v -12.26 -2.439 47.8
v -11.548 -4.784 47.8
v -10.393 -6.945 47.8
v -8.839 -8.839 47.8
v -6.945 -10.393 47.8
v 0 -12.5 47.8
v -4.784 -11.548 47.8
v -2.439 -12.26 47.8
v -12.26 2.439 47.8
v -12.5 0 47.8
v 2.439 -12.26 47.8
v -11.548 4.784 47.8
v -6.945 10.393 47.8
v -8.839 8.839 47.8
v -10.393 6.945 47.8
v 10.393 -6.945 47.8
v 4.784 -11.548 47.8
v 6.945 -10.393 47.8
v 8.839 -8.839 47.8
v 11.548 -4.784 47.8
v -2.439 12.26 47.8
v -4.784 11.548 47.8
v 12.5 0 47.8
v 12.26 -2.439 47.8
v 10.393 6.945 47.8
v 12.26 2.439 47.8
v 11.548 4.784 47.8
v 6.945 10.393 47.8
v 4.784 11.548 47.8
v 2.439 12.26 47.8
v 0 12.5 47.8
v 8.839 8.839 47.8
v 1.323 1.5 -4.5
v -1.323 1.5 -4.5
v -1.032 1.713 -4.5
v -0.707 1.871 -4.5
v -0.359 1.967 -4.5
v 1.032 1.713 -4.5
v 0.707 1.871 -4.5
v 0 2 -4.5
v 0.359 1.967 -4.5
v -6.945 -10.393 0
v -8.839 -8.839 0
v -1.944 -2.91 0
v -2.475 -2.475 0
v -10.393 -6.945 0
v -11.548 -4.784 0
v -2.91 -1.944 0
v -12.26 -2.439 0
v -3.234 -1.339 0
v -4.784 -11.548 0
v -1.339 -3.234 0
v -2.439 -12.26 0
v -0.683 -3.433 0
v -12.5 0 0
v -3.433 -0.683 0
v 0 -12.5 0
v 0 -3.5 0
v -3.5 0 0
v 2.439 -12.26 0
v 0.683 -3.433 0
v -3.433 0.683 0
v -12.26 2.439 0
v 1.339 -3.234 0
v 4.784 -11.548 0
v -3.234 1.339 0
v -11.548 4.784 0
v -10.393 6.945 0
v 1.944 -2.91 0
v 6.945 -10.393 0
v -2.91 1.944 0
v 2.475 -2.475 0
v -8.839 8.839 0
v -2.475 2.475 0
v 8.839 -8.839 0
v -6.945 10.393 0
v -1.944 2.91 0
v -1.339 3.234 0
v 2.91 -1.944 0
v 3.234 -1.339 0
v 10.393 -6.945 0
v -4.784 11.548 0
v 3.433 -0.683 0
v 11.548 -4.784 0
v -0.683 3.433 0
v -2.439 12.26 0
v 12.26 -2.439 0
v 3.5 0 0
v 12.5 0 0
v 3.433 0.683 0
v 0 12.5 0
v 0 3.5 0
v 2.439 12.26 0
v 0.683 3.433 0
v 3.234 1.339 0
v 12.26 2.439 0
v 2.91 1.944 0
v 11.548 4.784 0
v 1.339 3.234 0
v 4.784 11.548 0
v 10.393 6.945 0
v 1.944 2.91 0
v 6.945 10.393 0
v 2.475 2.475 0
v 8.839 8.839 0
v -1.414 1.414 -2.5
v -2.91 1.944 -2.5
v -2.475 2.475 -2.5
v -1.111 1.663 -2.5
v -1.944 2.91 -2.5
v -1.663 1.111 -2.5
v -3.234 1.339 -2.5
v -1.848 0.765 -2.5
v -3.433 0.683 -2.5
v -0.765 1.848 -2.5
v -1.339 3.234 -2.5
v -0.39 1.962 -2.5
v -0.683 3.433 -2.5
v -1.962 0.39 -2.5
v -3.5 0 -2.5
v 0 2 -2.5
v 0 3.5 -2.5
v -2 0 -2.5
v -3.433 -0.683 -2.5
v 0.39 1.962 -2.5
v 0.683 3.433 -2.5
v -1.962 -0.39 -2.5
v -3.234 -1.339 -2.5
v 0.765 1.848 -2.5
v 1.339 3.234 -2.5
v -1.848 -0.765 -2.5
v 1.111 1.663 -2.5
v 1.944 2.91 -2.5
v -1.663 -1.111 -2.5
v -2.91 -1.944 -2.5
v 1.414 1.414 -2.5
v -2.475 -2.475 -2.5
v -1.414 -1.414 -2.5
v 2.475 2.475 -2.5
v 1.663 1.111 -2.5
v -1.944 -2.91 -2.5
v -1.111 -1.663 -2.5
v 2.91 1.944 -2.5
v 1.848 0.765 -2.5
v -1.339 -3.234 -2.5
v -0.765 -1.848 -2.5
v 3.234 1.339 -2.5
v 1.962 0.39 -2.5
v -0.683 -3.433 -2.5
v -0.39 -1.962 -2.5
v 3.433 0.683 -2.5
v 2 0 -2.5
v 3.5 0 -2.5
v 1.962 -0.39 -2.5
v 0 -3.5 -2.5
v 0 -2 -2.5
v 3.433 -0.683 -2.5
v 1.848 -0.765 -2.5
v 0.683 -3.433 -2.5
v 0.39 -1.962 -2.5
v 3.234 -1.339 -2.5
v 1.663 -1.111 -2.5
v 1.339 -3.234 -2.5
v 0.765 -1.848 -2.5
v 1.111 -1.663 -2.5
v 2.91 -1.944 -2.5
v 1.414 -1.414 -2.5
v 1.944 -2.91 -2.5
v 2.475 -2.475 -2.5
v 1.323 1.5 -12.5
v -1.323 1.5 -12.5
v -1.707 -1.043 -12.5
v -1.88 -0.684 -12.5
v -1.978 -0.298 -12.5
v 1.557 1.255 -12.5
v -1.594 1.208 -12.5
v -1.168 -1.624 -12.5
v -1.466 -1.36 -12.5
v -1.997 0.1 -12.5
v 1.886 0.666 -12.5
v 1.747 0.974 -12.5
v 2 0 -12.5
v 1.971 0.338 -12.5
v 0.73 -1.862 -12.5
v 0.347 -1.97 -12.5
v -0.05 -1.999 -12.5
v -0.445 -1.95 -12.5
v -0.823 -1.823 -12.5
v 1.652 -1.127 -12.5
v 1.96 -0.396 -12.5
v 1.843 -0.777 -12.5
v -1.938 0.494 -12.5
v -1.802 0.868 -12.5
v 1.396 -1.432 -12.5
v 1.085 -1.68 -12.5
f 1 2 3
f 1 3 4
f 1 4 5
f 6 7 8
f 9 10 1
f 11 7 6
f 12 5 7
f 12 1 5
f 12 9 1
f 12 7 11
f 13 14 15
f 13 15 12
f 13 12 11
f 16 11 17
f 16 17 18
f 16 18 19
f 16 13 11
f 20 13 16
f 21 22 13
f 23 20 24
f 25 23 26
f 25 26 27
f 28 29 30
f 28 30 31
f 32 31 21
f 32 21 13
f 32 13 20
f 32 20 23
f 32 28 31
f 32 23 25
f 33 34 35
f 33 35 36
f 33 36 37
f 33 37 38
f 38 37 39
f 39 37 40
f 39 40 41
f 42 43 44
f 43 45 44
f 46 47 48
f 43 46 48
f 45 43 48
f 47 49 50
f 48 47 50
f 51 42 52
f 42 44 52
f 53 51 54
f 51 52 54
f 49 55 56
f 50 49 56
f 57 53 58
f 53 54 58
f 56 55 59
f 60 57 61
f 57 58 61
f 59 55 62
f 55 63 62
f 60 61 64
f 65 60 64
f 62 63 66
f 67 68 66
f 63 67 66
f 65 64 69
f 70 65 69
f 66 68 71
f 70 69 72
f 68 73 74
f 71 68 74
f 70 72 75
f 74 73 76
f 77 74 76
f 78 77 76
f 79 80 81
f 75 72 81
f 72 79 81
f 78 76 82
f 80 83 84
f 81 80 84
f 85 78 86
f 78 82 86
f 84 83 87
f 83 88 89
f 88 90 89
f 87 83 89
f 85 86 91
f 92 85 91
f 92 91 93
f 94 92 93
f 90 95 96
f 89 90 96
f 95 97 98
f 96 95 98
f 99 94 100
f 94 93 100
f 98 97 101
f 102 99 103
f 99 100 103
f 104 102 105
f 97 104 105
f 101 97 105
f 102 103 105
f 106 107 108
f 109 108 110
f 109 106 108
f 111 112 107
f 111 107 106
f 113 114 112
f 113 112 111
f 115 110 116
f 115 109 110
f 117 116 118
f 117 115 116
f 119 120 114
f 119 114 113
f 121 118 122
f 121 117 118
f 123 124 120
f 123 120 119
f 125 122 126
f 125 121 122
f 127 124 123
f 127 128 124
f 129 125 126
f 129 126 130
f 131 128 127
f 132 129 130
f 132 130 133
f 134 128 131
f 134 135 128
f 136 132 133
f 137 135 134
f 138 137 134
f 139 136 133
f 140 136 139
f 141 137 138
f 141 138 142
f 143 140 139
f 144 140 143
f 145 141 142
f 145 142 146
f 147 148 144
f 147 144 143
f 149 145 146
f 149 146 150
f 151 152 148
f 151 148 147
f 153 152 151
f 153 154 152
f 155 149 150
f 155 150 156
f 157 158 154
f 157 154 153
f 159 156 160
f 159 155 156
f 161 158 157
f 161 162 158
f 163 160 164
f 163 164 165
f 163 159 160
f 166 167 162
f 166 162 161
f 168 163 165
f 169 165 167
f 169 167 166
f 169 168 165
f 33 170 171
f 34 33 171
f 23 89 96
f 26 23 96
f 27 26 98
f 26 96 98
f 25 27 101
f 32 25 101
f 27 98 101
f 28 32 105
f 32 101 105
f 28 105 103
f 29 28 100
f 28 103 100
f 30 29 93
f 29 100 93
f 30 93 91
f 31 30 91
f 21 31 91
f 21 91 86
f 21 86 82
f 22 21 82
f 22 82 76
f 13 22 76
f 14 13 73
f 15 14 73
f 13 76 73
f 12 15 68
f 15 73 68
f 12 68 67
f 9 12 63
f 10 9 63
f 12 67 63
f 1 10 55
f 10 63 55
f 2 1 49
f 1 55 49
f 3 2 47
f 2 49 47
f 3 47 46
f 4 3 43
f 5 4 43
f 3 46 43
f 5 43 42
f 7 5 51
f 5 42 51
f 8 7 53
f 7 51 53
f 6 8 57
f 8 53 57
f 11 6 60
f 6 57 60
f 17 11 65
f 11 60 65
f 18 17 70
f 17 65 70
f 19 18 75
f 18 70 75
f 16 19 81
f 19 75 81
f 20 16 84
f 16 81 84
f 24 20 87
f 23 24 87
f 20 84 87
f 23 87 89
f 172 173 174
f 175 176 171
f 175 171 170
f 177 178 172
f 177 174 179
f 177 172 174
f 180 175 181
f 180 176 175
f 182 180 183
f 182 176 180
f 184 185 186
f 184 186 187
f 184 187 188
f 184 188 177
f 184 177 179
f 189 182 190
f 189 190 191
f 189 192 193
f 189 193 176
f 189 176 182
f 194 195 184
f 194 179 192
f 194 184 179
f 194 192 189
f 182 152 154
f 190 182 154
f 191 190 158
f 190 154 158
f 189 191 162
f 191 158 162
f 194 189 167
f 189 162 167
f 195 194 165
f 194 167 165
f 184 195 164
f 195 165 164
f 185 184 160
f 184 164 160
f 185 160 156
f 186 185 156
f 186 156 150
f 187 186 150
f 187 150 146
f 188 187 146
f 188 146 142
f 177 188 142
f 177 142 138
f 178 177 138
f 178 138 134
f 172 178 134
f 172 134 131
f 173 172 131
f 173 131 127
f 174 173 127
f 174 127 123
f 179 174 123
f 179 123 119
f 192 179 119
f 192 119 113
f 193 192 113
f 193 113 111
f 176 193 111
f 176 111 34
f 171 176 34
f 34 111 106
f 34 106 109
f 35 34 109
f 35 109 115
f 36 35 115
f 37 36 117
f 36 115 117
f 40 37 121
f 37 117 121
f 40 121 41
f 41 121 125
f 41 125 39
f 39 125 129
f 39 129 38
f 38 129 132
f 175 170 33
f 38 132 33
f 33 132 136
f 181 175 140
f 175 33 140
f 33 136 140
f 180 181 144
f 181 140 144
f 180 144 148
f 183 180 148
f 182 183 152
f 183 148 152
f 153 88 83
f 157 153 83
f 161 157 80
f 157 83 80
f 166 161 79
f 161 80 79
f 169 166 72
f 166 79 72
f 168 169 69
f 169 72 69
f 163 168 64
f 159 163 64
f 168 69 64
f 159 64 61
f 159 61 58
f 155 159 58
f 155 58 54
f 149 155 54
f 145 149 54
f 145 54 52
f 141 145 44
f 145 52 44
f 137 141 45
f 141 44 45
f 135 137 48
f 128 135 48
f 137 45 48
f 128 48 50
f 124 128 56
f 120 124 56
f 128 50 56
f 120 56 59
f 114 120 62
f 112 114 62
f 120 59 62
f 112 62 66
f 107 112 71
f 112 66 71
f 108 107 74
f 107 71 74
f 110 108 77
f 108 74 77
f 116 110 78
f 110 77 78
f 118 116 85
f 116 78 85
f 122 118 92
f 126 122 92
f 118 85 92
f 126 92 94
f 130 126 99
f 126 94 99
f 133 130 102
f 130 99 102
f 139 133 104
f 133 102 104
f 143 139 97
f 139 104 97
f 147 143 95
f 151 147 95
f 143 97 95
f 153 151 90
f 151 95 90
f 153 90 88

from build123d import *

# Parameters (mm, degrees)
F0_R     = 12.5
F1_DEPTH = 47.8
F2_R     = 3.5
F3_DEPTH = 2.5
F4_R     = 2
F5_DEPTH = 12.5
F7_DEPTH = 8


with BuildPart() as f1:
    # F0 (on Top) → F1 (new body)
    with BuildSketch(Plane.XY):
        Circle(F0_R)
    extrude(amount=F1_DEPTH)

    # F2 (on face) → F3 (join)
    with BuildSketch(Plane(origin=(0, 0, 0), x_dir=(1, 0, 0), z_dir=(0, 0, -1))):
        Circle(F2_R)
    extrude(amount=F3_DEPTH)

    # F4 (on face) → F5 (join)
    with BuildSketch(Plane(origin=(0, 0, 0), x_dir=(1, 0, 0), z_dir=(0, 0, -1))):
        Circle(F4_R)
    extrude(amount=F5_DEPTH)

    # F6 (on face) → F7 (cut)
    with BuildSketch(Plane(origin=(0, 0, -12.5), x_dir=(1, 0, 0), z_dir=(0, 0, -1))):
        with BuildLine():
            ThreePointArc((-1.322876, -1.5), (0, -2), (1.322876, -1.5))
            Line((1.322876, -1.5), (-1.322876, -1.5))
        make_face()
    extrude(amount=-F7_DEPTH, mode=Mode.SUBTRACT)


solid = f1.part
